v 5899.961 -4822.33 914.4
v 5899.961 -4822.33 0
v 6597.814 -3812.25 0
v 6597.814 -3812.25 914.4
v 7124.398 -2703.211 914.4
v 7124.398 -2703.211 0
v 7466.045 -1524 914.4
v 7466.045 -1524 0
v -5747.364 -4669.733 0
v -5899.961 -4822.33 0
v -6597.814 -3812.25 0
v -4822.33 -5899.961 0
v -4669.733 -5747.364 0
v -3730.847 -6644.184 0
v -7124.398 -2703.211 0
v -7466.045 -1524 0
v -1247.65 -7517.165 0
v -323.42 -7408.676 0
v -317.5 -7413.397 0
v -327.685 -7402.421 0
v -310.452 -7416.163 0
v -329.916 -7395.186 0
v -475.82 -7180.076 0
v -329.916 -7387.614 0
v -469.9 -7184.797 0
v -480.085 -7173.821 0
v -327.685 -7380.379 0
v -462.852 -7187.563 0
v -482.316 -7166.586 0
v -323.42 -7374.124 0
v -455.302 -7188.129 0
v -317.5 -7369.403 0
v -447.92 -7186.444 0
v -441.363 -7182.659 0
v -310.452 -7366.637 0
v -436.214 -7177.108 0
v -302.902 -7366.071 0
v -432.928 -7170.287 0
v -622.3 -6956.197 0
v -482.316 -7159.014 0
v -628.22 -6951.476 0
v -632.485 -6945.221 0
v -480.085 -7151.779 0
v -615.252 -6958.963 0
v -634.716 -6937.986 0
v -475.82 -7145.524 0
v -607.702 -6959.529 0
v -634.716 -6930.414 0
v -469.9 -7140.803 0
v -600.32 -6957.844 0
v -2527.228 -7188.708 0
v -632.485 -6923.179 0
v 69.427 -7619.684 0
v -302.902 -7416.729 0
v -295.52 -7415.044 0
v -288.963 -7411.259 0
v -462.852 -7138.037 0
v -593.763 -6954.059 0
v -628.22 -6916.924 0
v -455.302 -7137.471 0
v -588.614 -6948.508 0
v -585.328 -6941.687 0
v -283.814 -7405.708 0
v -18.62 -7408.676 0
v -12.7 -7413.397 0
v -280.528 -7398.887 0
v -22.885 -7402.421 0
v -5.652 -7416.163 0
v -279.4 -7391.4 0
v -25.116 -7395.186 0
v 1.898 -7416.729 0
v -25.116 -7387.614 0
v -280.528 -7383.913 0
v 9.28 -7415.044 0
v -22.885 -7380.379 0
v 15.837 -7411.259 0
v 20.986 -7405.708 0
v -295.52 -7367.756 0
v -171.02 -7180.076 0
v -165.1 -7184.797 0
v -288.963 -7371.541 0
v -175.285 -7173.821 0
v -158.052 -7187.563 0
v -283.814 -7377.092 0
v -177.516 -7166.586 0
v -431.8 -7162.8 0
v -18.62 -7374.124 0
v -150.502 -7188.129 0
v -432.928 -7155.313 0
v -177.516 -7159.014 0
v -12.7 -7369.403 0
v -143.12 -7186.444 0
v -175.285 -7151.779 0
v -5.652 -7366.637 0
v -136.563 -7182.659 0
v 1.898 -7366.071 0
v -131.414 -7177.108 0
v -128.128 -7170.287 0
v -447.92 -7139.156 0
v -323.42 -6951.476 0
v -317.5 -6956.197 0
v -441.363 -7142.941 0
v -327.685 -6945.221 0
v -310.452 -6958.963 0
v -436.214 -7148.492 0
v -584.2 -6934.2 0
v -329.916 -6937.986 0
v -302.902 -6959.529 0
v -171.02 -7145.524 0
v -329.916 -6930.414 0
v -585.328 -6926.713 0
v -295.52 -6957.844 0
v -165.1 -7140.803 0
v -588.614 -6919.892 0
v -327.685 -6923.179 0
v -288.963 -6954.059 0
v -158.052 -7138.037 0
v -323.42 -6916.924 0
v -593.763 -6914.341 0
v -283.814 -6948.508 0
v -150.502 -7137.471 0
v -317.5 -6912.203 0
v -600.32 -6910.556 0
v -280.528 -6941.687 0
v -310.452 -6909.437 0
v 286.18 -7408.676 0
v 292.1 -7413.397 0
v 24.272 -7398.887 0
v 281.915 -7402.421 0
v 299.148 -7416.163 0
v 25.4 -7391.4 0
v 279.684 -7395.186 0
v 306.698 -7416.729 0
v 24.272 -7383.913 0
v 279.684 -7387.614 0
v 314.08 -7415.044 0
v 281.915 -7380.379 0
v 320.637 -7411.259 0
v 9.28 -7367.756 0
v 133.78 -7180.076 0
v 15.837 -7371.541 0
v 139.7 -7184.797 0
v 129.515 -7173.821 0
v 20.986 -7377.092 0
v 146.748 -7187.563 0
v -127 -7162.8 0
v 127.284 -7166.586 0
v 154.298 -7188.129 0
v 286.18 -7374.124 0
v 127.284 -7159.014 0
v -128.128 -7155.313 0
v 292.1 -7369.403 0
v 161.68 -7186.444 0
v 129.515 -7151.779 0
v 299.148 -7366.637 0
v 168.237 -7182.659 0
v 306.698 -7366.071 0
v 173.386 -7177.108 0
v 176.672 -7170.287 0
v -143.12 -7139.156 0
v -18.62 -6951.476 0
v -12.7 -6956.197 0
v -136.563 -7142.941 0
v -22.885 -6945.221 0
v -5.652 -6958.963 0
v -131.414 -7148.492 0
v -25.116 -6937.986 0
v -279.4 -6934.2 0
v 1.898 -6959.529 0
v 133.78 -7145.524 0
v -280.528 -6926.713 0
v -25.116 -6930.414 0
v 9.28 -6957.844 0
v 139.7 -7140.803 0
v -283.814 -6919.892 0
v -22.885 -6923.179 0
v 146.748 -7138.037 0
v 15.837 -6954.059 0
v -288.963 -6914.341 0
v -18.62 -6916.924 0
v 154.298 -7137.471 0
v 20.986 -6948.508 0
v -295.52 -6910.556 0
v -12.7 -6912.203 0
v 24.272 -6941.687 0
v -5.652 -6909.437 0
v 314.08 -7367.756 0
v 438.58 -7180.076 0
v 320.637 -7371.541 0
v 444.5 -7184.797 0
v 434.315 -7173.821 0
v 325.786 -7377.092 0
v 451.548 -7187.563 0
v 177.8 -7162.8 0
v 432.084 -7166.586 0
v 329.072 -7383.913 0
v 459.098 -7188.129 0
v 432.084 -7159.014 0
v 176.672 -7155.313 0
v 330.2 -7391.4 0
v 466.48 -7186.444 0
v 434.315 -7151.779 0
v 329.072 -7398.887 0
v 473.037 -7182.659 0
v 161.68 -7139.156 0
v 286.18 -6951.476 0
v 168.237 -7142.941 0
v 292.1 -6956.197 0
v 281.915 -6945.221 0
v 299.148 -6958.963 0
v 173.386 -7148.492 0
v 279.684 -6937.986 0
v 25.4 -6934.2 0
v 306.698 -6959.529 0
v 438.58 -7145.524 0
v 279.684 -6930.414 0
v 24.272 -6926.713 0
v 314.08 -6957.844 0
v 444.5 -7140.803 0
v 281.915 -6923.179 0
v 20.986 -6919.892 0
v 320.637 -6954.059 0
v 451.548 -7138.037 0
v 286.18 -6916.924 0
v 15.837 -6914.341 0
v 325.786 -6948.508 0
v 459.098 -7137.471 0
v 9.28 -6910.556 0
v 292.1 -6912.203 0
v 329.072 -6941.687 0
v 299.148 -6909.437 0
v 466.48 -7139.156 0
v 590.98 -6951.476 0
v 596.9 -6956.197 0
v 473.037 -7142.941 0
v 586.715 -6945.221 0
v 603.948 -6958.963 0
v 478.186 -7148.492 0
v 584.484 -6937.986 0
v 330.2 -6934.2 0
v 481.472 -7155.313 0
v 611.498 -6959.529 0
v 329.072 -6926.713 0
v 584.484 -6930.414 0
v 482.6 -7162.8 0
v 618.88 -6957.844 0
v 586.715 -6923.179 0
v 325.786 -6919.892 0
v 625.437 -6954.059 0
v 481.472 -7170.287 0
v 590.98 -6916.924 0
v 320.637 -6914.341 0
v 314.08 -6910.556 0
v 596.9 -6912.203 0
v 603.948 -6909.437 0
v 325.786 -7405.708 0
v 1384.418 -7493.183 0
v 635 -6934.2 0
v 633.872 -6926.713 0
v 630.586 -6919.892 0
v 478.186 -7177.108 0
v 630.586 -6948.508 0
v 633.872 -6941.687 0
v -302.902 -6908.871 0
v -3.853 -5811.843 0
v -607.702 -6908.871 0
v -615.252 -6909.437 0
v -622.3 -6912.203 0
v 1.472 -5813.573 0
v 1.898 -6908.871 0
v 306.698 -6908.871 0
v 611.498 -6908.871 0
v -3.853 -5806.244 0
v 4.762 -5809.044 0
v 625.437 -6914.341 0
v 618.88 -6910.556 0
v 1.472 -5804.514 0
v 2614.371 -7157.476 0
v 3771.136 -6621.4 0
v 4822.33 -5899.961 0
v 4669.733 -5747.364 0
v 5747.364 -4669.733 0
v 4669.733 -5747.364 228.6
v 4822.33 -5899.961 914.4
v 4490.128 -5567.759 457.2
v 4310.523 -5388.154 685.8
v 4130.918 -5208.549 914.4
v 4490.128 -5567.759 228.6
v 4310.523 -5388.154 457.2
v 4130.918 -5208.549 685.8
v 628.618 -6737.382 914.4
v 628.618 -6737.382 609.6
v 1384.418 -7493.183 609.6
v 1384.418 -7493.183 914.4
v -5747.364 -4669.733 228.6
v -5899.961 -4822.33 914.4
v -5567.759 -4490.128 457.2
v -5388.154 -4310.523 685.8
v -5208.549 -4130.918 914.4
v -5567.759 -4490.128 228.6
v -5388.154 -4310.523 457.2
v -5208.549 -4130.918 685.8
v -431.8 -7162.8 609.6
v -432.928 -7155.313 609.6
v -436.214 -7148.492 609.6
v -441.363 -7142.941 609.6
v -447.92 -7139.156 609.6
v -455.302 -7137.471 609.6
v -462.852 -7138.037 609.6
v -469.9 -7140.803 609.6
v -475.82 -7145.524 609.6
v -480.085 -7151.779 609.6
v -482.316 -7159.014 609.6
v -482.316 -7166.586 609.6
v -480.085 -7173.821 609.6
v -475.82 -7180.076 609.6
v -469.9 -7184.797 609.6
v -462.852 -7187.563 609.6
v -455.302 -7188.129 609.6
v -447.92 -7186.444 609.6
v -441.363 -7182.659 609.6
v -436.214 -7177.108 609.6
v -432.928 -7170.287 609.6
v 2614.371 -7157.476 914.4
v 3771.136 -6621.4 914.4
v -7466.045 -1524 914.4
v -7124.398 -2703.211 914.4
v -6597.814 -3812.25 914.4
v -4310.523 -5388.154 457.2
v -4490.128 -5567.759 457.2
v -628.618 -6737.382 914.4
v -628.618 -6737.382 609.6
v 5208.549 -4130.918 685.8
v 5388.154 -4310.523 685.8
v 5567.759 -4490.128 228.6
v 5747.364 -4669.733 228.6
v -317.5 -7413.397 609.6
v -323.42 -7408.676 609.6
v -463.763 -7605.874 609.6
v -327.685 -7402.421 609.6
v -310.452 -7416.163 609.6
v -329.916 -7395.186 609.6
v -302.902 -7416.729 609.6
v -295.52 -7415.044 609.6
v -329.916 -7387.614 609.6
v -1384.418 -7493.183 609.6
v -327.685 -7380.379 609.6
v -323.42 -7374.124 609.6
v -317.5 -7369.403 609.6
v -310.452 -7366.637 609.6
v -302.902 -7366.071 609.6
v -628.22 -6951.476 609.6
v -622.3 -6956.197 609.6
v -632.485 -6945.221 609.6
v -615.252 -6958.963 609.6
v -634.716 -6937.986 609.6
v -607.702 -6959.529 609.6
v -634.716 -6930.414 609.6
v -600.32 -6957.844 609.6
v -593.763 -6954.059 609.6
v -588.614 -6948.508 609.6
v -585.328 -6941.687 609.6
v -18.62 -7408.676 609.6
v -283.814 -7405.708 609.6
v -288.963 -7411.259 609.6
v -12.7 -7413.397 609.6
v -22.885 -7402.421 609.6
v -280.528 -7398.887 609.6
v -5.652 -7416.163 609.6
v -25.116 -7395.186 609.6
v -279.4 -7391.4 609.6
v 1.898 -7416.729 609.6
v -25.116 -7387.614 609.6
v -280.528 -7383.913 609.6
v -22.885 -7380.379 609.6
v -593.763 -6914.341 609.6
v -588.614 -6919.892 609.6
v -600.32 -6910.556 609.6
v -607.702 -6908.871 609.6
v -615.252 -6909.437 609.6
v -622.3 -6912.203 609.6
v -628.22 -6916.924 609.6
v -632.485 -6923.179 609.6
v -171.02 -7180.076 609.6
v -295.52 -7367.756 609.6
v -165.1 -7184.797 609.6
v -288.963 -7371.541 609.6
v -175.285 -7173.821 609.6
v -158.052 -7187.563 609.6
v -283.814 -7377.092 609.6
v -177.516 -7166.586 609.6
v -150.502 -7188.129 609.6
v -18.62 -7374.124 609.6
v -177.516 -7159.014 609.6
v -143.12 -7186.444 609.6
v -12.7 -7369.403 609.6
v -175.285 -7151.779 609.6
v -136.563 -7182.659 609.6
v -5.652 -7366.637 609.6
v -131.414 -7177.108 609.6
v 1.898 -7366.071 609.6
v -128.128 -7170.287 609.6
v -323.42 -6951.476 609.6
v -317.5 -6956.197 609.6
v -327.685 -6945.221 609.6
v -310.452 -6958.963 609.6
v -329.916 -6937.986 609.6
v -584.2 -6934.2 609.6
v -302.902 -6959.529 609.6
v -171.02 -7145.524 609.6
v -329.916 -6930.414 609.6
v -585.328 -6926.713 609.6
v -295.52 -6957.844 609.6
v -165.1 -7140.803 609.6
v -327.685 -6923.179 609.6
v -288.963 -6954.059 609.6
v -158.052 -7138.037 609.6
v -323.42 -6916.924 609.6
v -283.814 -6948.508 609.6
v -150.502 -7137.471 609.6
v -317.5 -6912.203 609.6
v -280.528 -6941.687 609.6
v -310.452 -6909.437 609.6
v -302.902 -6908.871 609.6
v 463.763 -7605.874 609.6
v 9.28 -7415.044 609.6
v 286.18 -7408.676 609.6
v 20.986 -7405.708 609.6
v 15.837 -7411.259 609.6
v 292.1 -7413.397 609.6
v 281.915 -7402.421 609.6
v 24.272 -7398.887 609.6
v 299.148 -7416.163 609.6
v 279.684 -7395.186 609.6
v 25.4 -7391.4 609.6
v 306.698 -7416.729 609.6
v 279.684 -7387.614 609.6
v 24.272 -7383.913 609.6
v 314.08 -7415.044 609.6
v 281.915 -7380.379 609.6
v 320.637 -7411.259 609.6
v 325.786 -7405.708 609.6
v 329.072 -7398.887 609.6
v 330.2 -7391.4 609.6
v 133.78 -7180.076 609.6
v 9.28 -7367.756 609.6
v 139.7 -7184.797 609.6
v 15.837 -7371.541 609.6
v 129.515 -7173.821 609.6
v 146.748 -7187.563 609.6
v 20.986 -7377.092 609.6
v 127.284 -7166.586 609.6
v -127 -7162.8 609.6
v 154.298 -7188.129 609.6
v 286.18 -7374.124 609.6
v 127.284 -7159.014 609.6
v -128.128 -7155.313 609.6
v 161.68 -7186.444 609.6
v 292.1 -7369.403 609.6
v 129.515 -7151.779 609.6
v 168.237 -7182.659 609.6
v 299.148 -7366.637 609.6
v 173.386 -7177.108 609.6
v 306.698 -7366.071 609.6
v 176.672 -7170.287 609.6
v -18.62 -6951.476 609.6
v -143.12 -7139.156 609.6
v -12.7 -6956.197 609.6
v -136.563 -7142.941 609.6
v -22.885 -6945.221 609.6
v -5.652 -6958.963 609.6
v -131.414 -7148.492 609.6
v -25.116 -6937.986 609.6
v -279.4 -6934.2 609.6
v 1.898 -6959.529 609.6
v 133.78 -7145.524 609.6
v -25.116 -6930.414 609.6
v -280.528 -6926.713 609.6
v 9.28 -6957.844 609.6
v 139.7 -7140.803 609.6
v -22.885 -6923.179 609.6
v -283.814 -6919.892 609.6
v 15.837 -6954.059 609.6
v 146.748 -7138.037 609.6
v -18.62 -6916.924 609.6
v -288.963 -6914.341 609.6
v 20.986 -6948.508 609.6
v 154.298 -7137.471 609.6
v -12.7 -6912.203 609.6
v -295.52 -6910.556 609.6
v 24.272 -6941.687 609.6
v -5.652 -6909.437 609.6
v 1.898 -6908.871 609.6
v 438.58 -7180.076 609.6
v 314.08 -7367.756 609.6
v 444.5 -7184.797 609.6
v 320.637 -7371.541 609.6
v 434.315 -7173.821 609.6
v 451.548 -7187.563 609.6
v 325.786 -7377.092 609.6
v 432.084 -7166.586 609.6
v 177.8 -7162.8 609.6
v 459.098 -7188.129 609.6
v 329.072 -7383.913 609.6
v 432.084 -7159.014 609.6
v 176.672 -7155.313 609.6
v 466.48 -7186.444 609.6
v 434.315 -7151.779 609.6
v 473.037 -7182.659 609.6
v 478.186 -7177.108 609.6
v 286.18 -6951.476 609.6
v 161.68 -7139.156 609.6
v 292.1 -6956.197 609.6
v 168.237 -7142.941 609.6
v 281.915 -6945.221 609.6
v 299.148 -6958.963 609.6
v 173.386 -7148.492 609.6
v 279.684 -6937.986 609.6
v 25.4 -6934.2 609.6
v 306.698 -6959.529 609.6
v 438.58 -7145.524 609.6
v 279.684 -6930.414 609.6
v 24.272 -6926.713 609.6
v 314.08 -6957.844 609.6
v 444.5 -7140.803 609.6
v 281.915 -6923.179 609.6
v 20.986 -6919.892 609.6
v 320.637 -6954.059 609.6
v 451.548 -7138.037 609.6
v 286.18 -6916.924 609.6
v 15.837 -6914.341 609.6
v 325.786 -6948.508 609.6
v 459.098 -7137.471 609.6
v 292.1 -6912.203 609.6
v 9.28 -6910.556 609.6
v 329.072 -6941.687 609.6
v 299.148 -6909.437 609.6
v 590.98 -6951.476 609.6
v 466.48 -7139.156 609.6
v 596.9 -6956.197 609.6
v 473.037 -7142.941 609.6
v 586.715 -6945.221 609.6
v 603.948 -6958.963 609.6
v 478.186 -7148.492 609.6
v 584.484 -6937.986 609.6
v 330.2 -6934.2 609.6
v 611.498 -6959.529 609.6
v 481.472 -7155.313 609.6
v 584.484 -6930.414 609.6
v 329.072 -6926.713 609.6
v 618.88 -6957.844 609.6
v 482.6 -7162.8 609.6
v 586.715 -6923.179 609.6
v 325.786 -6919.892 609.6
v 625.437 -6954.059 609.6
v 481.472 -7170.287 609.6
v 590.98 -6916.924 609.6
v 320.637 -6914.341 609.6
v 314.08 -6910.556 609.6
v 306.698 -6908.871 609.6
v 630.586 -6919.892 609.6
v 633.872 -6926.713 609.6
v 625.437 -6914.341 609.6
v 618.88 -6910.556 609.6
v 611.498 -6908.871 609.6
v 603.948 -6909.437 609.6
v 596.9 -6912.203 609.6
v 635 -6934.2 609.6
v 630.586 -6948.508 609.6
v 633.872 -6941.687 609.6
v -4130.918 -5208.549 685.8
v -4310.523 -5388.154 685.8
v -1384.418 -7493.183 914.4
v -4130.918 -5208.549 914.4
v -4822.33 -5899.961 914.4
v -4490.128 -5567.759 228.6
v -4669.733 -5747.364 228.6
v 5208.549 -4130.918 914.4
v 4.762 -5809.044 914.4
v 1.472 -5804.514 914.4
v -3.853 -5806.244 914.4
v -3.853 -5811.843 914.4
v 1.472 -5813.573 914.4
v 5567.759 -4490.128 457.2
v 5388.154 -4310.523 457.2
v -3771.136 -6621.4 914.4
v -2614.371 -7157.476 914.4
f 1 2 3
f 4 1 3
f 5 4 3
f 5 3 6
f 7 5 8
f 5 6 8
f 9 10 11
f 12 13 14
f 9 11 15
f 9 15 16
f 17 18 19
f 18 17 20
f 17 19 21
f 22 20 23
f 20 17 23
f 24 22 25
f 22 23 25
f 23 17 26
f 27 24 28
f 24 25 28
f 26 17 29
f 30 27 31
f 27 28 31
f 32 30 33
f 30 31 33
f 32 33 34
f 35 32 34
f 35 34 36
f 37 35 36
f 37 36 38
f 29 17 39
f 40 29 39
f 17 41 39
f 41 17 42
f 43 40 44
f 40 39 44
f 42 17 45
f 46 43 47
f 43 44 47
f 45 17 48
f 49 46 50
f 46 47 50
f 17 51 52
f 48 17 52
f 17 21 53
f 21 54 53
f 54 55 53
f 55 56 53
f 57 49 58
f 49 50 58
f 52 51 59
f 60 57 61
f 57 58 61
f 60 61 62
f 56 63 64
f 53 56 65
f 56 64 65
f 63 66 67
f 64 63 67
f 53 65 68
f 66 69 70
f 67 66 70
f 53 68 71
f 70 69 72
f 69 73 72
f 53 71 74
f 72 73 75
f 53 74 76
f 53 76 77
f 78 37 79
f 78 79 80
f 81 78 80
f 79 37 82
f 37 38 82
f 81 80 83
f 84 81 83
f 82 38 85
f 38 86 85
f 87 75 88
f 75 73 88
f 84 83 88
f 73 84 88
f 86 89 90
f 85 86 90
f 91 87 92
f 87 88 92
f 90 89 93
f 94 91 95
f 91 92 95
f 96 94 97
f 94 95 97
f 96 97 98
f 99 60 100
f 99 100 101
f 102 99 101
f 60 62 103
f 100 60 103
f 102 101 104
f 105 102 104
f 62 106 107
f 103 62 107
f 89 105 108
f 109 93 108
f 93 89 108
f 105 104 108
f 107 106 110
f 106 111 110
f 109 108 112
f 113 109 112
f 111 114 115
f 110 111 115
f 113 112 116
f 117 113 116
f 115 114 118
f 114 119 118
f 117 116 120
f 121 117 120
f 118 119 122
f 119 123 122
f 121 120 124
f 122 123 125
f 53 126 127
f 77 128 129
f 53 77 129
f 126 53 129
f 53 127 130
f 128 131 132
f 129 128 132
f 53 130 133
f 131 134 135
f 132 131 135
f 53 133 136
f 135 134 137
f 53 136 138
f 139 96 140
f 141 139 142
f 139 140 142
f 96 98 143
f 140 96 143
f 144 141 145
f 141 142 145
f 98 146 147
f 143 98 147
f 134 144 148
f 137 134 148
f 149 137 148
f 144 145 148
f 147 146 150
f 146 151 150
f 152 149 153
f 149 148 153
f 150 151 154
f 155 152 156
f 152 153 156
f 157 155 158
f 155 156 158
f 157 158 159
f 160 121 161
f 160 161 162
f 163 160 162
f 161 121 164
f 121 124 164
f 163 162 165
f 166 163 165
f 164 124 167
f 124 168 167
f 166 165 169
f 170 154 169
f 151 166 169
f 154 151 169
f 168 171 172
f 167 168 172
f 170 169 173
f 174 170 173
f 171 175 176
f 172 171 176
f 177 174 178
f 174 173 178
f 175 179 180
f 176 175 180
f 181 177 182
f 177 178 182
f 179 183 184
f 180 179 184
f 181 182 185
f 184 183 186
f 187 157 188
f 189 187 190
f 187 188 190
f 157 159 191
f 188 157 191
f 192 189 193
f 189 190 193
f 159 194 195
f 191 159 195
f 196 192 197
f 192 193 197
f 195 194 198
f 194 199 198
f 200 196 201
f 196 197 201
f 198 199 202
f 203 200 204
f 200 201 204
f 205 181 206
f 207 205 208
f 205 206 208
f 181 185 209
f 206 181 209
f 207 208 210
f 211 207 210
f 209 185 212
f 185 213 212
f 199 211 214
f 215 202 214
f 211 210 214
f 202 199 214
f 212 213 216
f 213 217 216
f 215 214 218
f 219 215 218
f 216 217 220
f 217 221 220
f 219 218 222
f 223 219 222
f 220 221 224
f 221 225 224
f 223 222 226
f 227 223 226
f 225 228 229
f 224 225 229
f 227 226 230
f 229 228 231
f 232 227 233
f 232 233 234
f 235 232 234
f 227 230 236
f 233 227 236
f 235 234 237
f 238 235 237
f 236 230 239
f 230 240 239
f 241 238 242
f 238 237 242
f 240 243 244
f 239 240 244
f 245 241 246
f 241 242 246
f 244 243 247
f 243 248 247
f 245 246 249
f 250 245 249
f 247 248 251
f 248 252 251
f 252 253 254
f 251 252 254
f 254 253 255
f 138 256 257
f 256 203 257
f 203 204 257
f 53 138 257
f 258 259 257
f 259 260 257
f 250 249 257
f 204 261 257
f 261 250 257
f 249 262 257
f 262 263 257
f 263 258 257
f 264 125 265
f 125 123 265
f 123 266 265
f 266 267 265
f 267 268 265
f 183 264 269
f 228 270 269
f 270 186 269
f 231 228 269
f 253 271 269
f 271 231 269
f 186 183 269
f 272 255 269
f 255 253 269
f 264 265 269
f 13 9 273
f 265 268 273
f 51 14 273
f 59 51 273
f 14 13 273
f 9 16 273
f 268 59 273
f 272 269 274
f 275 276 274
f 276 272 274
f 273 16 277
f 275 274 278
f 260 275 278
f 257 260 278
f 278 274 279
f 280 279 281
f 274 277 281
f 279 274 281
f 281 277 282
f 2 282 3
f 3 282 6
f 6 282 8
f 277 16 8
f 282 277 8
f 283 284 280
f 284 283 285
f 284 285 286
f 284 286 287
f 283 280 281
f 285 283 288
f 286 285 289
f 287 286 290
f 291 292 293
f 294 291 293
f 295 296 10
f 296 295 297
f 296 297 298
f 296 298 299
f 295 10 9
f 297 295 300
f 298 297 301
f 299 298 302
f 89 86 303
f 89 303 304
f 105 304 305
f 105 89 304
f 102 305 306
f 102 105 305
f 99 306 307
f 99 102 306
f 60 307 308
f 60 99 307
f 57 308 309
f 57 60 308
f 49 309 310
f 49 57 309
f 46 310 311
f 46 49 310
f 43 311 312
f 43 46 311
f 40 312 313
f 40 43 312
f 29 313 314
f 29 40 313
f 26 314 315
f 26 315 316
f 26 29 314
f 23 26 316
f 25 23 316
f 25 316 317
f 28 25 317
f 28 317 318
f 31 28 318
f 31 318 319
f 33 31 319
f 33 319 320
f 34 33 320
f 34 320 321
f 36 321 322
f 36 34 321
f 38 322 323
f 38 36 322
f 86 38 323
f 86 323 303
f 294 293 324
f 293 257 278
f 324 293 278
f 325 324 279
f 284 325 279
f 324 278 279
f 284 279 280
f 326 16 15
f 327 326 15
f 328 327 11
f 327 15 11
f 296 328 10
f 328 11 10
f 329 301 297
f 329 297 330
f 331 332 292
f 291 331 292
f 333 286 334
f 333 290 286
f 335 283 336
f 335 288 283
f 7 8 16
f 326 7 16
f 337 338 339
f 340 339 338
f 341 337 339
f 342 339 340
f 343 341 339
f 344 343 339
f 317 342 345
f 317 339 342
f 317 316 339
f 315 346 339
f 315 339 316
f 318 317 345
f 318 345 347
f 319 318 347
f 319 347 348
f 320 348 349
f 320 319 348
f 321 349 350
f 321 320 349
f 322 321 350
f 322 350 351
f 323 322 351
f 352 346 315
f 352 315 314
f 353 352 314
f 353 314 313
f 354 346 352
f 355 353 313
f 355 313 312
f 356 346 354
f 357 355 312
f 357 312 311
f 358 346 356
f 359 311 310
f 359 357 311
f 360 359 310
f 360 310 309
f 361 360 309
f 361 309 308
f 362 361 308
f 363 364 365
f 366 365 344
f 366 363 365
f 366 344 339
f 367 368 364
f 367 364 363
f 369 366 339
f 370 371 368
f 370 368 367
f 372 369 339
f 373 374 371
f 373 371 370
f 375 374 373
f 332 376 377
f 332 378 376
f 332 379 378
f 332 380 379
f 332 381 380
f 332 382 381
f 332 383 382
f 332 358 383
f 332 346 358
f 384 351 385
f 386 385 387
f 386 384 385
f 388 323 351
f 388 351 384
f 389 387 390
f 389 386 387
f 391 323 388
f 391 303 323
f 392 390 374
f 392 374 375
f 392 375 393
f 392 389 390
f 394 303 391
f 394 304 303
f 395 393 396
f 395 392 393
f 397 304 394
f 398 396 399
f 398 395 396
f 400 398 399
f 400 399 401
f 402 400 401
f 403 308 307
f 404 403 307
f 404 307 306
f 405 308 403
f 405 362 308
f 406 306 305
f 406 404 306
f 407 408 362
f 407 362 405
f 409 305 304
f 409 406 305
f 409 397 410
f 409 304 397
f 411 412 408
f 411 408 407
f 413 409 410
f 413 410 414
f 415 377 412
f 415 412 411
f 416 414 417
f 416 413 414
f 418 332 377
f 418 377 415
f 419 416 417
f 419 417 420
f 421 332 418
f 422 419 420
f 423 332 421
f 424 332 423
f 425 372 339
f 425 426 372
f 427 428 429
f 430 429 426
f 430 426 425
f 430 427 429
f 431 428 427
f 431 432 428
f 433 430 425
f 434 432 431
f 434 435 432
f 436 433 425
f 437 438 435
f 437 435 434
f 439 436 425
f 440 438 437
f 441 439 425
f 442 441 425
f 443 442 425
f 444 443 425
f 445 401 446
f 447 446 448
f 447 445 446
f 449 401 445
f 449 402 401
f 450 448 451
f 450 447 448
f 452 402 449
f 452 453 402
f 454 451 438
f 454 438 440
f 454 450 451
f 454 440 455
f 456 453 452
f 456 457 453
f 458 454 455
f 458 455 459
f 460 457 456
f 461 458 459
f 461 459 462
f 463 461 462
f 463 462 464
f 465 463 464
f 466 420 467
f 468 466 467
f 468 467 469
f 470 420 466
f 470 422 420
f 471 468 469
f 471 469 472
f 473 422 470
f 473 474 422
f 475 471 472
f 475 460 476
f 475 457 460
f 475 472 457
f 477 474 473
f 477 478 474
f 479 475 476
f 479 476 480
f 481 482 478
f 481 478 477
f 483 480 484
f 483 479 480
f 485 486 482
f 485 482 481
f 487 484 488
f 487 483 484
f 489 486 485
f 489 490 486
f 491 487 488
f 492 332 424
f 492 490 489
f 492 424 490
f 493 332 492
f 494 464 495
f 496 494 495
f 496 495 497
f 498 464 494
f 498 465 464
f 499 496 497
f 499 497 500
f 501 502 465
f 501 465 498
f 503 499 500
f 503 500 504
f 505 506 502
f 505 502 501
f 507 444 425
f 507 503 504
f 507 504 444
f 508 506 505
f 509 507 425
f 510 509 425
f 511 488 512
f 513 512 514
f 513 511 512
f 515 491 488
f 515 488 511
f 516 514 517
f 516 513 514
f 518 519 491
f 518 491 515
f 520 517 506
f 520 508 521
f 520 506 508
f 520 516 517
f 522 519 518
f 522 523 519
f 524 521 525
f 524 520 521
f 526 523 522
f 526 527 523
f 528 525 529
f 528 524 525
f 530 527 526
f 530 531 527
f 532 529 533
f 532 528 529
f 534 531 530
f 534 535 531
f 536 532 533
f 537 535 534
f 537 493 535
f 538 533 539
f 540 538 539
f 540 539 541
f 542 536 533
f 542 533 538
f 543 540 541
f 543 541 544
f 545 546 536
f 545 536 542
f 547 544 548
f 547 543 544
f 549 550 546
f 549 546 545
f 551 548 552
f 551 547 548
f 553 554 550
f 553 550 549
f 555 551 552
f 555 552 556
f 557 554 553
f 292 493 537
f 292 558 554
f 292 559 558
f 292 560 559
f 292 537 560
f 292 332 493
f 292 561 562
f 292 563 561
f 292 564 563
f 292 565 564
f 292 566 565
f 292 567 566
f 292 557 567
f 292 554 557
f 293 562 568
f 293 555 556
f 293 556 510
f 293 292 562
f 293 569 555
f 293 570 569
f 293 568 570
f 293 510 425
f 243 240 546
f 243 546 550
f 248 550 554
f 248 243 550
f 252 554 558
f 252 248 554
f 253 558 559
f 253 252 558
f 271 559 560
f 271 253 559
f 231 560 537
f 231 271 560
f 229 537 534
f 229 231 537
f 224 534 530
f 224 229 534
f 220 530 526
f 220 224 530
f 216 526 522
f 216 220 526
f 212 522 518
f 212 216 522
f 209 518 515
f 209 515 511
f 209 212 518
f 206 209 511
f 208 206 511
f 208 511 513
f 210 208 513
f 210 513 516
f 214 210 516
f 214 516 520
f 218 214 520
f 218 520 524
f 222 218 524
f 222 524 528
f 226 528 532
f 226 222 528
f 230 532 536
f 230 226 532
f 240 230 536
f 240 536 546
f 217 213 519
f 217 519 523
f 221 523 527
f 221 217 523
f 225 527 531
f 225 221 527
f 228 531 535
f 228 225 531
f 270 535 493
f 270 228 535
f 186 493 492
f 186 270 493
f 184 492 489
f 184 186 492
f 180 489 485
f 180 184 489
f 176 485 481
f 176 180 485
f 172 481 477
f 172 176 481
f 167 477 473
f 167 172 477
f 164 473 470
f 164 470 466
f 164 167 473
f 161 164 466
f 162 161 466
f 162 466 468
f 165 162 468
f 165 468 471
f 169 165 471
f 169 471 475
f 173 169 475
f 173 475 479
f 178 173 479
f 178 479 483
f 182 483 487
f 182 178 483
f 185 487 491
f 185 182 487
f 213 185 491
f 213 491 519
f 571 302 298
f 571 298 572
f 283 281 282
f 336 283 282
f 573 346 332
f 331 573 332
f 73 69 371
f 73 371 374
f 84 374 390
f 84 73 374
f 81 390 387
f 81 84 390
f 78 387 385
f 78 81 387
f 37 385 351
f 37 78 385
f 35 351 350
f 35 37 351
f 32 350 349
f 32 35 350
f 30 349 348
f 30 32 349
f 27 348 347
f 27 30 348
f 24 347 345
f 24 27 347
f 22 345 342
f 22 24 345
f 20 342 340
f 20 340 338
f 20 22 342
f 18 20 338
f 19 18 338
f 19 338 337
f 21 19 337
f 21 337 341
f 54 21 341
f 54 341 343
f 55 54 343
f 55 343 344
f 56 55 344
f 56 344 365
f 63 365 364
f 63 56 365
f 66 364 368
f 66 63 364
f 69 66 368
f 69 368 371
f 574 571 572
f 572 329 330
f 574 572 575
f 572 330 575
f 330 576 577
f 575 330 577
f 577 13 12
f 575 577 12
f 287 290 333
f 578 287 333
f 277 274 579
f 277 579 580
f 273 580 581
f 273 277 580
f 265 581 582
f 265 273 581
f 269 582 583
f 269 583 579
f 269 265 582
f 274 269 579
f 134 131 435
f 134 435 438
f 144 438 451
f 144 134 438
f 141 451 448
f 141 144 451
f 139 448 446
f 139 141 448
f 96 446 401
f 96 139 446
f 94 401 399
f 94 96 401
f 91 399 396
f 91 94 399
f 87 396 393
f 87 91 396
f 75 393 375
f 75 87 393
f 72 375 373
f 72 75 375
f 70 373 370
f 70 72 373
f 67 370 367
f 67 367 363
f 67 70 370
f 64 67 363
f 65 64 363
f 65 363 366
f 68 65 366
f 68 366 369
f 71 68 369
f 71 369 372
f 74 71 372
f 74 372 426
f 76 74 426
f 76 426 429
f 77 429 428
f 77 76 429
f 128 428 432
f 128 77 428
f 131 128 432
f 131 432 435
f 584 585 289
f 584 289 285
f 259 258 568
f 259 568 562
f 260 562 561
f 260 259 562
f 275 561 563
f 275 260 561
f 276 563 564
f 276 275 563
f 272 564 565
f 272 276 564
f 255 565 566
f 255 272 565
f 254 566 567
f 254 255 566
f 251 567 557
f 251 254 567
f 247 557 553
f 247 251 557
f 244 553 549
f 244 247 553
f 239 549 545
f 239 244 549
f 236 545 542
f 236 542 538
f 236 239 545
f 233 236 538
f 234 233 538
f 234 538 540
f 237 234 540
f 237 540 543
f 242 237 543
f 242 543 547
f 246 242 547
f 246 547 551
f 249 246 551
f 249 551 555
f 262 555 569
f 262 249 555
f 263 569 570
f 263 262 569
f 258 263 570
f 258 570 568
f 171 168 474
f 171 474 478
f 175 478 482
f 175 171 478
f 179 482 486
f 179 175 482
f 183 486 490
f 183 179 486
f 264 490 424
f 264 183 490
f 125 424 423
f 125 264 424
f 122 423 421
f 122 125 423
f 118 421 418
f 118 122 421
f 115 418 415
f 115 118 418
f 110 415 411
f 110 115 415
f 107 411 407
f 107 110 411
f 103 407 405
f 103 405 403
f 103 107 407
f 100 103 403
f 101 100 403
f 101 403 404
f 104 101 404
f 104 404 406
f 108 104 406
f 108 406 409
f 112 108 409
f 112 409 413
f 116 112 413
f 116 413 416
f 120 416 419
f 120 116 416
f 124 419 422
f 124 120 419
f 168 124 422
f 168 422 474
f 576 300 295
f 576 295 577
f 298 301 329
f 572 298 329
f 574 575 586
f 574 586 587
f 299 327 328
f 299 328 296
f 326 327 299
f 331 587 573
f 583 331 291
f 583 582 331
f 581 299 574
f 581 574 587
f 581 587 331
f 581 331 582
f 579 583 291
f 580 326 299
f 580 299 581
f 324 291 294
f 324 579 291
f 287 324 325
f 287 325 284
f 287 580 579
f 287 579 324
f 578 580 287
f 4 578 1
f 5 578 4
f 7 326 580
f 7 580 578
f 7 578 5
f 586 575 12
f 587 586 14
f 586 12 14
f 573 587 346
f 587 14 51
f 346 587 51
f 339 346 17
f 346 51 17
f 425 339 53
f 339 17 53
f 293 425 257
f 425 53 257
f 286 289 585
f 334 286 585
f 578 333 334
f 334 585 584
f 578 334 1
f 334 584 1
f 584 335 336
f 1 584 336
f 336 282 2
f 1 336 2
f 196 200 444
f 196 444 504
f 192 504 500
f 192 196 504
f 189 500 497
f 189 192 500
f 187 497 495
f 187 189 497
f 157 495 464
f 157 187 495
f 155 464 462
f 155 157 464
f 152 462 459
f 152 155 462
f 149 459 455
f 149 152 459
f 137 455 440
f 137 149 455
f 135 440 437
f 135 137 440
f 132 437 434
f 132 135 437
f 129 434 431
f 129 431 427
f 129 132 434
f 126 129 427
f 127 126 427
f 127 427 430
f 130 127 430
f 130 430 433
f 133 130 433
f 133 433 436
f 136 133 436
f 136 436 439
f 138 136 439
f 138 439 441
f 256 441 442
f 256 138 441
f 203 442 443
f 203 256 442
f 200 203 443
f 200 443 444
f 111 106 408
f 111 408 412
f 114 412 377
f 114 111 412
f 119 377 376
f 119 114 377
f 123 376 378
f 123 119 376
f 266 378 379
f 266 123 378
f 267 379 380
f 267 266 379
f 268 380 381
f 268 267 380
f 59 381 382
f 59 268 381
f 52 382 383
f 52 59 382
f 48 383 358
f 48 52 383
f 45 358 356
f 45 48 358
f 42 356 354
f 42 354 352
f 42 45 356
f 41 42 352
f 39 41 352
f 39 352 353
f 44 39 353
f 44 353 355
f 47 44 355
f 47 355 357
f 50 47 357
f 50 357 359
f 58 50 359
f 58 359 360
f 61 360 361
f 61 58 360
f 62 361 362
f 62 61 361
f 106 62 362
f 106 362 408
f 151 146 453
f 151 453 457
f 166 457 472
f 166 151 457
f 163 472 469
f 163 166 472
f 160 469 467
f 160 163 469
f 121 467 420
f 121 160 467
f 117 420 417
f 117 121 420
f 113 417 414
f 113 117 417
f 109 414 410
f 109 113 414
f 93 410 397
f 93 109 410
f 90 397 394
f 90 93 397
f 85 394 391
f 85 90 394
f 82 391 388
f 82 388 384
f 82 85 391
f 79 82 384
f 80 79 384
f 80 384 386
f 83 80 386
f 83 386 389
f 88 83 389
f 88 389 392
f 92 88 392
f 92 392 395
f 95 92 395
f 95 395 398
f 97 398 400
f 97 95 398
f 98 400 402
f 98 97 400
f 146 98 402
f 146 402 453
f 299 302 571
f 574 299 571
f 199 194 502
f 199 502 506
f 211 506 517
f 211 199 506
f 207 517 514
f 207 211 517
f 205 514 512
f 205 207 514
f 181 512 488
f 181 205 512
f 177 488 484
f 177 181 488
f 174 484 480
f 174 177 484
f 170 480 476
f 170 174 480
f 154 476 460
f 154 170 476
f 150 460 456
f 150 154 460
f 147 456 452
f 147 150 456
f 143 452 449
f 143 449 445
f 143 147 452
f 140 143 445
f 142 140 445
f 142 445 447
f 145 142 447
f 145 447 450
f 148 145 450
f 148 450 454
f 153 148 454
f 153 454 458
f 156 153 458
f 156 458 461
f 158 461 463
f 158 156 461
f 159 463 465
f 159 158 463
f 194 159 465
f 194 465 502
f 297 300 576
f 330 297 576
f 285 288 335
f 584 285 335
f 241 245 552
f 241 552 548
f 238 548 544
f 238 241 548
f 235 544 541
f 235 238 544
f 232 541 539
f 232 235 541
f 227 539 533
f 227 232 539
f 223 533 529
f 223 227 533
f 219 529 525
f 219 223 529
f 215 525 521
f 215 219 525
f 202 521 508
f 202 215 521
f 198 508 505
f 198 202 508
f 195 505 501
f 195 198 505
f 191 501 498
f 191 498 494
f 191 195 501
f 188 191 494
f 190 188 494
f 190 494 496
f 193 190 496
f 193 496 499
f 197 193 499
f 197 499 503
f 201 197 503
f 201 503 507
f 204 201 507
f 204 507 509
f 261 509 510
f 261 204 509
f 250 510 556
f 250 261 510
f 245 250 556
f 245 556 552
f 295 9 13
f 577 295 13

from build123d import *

# Parameters (mm, degrees)
F0_R     = 4.7625
F1_DEPTH = 914.4
F0_R_2   = 25.4
F2_DEPTH = 609.6
F3_DEPTH = 685.8
F4_DEPTH = 457.2
F5_DEPTH = 228.6


# Not quite as in the source:
# - a feature names something its author has since deleted; it is built from what else it names


with BuildPart() as f1:
    # F0 (on Top) → F1 (new body)
    with BuildSketch(Plane.XY):
        with BuildLine():
            ThreePointArc((5899.9605807424, -4822.3298462139), (6883.4780071868, -3268.3528763853), (7466.0447360031, -1524))
            Line((7466.0447360031, -1524), (-7466.0447360031, -1524))
            ThreePointArc((-7466.0447360031, -1524), (-6883.4780071868, -3268.3528763853), (-5899.9605807424, -4822.3298462139))
            Line((-5899.9605807423, -4822.329846214), (-5747.3639174843, -4669.733182956))
            Line((-5747.3639174843, -4669.733182956), (-5567.7587950629, -4490.1280605346))
            Line((-5567.7587950629, -4490.1280605346), (-5388.1536726415, -4310.5229381132))
            Line((-5388.1536726415, -4310.5229381132), (-5208.5485502201, -4130.9178156918))
            Line((-5208.5485502201, -4130.9178156918), (-4130.9178156918, -5208.5485502201))
            Line((-4130.9178156918, -5208.5485502201), (-4310.5229381132, -5388.1536726415))
            Line((-4310.5229381132, -5388.1536726415), (-4490.1280605346, -5567.7587950629))
            Line((-4490.1280605346, -5567.7587950629), (-4669.733182956, -5747.3639174843))
            Line((-4669.733182956, -5747.3639174843), (-4822.329846214, -5899.9605807423))
            ThreePointArc((-4822.3298462139, -5899.9605807424), (-3203.9850558878, -6913.6733913056), (-1384.4184602791, -7493.1826033294))
            Line((-1384.4184602791, -7493.1826033294), (-628.6179284748, -6737.3820715252))
            ThreePointArc((-628.6179284748, -6737.3820715252), (0, -6477), (628.6179284748, -6737.3820715252))
            Line((628.6179284748, -6737.3820715252), (1384.4184602791, -7493.1826033294))
            ThreePointArc((1384.4184602791, -7493.1826033294), (3203.9850558878, -6913.6733913056), (4822.3298462139, -5899.9605807424))
            Line((4822.329846214, -5899.9605807423), (4669.733182956, -5747.3639174843))
            Line((4669.733182956, -5747.3639174843), (4490.1280605346, -5567.7587950629))
            Line((4490.1280605346, -5567.7587950629), (4310.5229381132, -5388.1536726415))
            Line((4310.5229381132, -5388.1536726415), (4130.9178156918, -5208.5485502201))
            Line((4130.9178156918, -5208.5485502201), (5208.5485502201, -4130.9178156918))
            Line((5208.5485502201, -4130.9178156918), (5388.1536726415, -4310.5229381132))
            Line((5388.1536726415, -4310.5229381132), (5567.7587950629, -4490.1280605346))
            Line((5567.7587950629, -4490.1280605346), (5747.3639174843, -4669.733182956))
            Line((5747.3639174843, -4669.733182956), (5899.9605807423, -4822.329846214))
        make_face()
        with Locations((0, -5809.0438066988)):
            Circle(F0_R, mode=Mode.SUBTRACT)
        with BuildLine():
            Line((-628.6179284748, -6737.3820715252), (628.6179284748, -6737.3820715252))
            ThreePointArc((628.6179284748, -6737.3820715252), (0, -6477), (-628.6179284748, -6737.3820715252))
        make_face()
    extrude(amount=F1_DEPTH)

    # F0 (on Top) → F2 (join)
    with BuildSketch(Plane.XY):
        with BuildLine():
            Line((-628.6179284748, -6737.3820715252), (-1384.4184602791, -7493.1826033294))
            ThreePointArc((-1384.4184602791, -7493.1826033294), (-1125.4295623842, -7536.4320669739), (-865.104327551, -7570.7327586207))
            ThreePointArc((-865.104327551, -7570.7327586207), (-855.2308965756, -7123.3044838845), (-628.6179284748, -6737.3820715252))
        make_face()
        with BuildLine():
            ThreePointArc((865.104327551, -7570.7327586207), (1125.4295623842, -7536.4320669739), (1384.4184602791, -7493.1826033294))
            Line((1384.4184602791, -7493.1826033294), (628.6179284748, -6737.3820715252))
            ThreePointArc((628.6179284748, -6737.3820715252), (821.3289044025, -7025.7944286274), (889, -7366))
            ThreePointArc((889, -7366), (883.0058740441, -7469.0612749948), (865.104327551, -7570.7327586207))
        make_face()
        with BuildLine():
            ThreePointArc((-865.104327551, -7570.7327586207), (0, -7620), (865.104327551, -7570.7327586207))
            ThreePointArc((865.104327551, -7570.7327586207), (883.0058740441, -7469.0612749948), (889, -7366))
            ThreePointArc((889, -7366), (821.3289044025, -7025.7944286274), (628.6179284748, -6737.3820715252))
            Line((628.6179284748, -6737.3820715252), (-628.6179284748, -6737.3820715252))
            ThreePointArc((-628.6179284748, -6737.3820715252), (-855.2308965756, -7123.3044838845), (-865.104327551, -7570.7327586207))
        make_face()
        with Locations((-304.8, -7391.4)):
            Circle(F0_R_2, mode=Mode.SUBTRACT)
        with Locations((0, -7391.4)):
            Circle(F0_R_2, mode=Mode.SUBTRACT)
        with Locations((-457.2, -7162.8)):
            Circle(F0_R_2, mode=Mode.SUBTRACT)
        with Locations((-152.4, -7162.8)):
            Circle(F0_R_2, mode=Mode.SUBTRACT)
        with Locations((-609.6, -6934.2)):
            Circle(F0_R_2, mode=Mode.SUBTRACT)
        with Locations((-304.8, -6934.2)):
            Circle(F0_R_2, mode=Mode.SUBTRACT)
        with Locations((0, -6934.2)):
            Circle(F0_R_2, mode=Mode.SUBTRACT)
        with Locations((304.8, -7391.4)):
            Circle(F0_R_2, mode=Mode.SUBTRACT)
        with Locations((152.4, -7162.8)):
            Circle(F0_R_2, mode=Mode.SUBTRACT)
        with Locations((457.2, -7162.8)):
            Circle(F0_R_2, mode=Mode.SUBTRACT)
        with Locations((304.8, -6934.2)):
            Circle(F0_R_2, mode=Mode.SUBTRACT)
        with Locations((609.6, -6934.2)):
            Circle(F0_R_2, mode=Mode.SUBTRACT)
    extrude(amount=F2_DEPTH)

    # F0 (on Top) → F3 (join)
    with BuildSketch(Plane.XY):
        Polygon((-5208.5485502201, -4130.9178156918), (-5388.1536726415, -4310.5229381132), (-4310.5229381132, -5388.1536726415), (-4130.9178156918, -5208.5485502201), align=None)
        Polygon((4310.5229381132, -5388.1536726415), (5388.1536726415, -4310.5229381132), (5208.5485502201, -4130.9178156918), (4130.9178156918, -5208.5485502201), align=None)
    extrude(amount=F3_DEPTH)

    # F0 (on Top) → F4 (join)
    with BuildSketch(Plane.XY):
        Polygon((-5388.1536726415, -4310.5229381132), (-5567.7587950629, -4490.1280605346), (-4490.1280605346, -5567.7587950629), (-4310.5229381132, -5388.1536726415), align=None)
        Polygon((4490.1280605346, -5567.7587950629), (5567.7587950629, -4490.1280605346), (5388.1536726415, -4310.5229381132), (4310.5229381132, -5388.1536726415), align=None)
    extrude(amount=F4_DEPTH)

    # F0 (on Top) → F5 (join)
    with BuildSketch(Plane.XY):
        Polygon((-5567.7587950629, -4490.1280605346), (-5747.3639174843, -4669.733182956), (-4669.733182956, -5747.3639174843), (-4490.1280605346, -5567.7587950629), align=None)
        Polygon((4669.733182956, -5747.3639174843), (5747.3639174843, -4669.733182956), (5567.7587950629, -4490.1280605346), (4490.1280605346, -5567.7587950629), align=None)
    extrude(amount=F5_DEPTH)


solid = f1.part
